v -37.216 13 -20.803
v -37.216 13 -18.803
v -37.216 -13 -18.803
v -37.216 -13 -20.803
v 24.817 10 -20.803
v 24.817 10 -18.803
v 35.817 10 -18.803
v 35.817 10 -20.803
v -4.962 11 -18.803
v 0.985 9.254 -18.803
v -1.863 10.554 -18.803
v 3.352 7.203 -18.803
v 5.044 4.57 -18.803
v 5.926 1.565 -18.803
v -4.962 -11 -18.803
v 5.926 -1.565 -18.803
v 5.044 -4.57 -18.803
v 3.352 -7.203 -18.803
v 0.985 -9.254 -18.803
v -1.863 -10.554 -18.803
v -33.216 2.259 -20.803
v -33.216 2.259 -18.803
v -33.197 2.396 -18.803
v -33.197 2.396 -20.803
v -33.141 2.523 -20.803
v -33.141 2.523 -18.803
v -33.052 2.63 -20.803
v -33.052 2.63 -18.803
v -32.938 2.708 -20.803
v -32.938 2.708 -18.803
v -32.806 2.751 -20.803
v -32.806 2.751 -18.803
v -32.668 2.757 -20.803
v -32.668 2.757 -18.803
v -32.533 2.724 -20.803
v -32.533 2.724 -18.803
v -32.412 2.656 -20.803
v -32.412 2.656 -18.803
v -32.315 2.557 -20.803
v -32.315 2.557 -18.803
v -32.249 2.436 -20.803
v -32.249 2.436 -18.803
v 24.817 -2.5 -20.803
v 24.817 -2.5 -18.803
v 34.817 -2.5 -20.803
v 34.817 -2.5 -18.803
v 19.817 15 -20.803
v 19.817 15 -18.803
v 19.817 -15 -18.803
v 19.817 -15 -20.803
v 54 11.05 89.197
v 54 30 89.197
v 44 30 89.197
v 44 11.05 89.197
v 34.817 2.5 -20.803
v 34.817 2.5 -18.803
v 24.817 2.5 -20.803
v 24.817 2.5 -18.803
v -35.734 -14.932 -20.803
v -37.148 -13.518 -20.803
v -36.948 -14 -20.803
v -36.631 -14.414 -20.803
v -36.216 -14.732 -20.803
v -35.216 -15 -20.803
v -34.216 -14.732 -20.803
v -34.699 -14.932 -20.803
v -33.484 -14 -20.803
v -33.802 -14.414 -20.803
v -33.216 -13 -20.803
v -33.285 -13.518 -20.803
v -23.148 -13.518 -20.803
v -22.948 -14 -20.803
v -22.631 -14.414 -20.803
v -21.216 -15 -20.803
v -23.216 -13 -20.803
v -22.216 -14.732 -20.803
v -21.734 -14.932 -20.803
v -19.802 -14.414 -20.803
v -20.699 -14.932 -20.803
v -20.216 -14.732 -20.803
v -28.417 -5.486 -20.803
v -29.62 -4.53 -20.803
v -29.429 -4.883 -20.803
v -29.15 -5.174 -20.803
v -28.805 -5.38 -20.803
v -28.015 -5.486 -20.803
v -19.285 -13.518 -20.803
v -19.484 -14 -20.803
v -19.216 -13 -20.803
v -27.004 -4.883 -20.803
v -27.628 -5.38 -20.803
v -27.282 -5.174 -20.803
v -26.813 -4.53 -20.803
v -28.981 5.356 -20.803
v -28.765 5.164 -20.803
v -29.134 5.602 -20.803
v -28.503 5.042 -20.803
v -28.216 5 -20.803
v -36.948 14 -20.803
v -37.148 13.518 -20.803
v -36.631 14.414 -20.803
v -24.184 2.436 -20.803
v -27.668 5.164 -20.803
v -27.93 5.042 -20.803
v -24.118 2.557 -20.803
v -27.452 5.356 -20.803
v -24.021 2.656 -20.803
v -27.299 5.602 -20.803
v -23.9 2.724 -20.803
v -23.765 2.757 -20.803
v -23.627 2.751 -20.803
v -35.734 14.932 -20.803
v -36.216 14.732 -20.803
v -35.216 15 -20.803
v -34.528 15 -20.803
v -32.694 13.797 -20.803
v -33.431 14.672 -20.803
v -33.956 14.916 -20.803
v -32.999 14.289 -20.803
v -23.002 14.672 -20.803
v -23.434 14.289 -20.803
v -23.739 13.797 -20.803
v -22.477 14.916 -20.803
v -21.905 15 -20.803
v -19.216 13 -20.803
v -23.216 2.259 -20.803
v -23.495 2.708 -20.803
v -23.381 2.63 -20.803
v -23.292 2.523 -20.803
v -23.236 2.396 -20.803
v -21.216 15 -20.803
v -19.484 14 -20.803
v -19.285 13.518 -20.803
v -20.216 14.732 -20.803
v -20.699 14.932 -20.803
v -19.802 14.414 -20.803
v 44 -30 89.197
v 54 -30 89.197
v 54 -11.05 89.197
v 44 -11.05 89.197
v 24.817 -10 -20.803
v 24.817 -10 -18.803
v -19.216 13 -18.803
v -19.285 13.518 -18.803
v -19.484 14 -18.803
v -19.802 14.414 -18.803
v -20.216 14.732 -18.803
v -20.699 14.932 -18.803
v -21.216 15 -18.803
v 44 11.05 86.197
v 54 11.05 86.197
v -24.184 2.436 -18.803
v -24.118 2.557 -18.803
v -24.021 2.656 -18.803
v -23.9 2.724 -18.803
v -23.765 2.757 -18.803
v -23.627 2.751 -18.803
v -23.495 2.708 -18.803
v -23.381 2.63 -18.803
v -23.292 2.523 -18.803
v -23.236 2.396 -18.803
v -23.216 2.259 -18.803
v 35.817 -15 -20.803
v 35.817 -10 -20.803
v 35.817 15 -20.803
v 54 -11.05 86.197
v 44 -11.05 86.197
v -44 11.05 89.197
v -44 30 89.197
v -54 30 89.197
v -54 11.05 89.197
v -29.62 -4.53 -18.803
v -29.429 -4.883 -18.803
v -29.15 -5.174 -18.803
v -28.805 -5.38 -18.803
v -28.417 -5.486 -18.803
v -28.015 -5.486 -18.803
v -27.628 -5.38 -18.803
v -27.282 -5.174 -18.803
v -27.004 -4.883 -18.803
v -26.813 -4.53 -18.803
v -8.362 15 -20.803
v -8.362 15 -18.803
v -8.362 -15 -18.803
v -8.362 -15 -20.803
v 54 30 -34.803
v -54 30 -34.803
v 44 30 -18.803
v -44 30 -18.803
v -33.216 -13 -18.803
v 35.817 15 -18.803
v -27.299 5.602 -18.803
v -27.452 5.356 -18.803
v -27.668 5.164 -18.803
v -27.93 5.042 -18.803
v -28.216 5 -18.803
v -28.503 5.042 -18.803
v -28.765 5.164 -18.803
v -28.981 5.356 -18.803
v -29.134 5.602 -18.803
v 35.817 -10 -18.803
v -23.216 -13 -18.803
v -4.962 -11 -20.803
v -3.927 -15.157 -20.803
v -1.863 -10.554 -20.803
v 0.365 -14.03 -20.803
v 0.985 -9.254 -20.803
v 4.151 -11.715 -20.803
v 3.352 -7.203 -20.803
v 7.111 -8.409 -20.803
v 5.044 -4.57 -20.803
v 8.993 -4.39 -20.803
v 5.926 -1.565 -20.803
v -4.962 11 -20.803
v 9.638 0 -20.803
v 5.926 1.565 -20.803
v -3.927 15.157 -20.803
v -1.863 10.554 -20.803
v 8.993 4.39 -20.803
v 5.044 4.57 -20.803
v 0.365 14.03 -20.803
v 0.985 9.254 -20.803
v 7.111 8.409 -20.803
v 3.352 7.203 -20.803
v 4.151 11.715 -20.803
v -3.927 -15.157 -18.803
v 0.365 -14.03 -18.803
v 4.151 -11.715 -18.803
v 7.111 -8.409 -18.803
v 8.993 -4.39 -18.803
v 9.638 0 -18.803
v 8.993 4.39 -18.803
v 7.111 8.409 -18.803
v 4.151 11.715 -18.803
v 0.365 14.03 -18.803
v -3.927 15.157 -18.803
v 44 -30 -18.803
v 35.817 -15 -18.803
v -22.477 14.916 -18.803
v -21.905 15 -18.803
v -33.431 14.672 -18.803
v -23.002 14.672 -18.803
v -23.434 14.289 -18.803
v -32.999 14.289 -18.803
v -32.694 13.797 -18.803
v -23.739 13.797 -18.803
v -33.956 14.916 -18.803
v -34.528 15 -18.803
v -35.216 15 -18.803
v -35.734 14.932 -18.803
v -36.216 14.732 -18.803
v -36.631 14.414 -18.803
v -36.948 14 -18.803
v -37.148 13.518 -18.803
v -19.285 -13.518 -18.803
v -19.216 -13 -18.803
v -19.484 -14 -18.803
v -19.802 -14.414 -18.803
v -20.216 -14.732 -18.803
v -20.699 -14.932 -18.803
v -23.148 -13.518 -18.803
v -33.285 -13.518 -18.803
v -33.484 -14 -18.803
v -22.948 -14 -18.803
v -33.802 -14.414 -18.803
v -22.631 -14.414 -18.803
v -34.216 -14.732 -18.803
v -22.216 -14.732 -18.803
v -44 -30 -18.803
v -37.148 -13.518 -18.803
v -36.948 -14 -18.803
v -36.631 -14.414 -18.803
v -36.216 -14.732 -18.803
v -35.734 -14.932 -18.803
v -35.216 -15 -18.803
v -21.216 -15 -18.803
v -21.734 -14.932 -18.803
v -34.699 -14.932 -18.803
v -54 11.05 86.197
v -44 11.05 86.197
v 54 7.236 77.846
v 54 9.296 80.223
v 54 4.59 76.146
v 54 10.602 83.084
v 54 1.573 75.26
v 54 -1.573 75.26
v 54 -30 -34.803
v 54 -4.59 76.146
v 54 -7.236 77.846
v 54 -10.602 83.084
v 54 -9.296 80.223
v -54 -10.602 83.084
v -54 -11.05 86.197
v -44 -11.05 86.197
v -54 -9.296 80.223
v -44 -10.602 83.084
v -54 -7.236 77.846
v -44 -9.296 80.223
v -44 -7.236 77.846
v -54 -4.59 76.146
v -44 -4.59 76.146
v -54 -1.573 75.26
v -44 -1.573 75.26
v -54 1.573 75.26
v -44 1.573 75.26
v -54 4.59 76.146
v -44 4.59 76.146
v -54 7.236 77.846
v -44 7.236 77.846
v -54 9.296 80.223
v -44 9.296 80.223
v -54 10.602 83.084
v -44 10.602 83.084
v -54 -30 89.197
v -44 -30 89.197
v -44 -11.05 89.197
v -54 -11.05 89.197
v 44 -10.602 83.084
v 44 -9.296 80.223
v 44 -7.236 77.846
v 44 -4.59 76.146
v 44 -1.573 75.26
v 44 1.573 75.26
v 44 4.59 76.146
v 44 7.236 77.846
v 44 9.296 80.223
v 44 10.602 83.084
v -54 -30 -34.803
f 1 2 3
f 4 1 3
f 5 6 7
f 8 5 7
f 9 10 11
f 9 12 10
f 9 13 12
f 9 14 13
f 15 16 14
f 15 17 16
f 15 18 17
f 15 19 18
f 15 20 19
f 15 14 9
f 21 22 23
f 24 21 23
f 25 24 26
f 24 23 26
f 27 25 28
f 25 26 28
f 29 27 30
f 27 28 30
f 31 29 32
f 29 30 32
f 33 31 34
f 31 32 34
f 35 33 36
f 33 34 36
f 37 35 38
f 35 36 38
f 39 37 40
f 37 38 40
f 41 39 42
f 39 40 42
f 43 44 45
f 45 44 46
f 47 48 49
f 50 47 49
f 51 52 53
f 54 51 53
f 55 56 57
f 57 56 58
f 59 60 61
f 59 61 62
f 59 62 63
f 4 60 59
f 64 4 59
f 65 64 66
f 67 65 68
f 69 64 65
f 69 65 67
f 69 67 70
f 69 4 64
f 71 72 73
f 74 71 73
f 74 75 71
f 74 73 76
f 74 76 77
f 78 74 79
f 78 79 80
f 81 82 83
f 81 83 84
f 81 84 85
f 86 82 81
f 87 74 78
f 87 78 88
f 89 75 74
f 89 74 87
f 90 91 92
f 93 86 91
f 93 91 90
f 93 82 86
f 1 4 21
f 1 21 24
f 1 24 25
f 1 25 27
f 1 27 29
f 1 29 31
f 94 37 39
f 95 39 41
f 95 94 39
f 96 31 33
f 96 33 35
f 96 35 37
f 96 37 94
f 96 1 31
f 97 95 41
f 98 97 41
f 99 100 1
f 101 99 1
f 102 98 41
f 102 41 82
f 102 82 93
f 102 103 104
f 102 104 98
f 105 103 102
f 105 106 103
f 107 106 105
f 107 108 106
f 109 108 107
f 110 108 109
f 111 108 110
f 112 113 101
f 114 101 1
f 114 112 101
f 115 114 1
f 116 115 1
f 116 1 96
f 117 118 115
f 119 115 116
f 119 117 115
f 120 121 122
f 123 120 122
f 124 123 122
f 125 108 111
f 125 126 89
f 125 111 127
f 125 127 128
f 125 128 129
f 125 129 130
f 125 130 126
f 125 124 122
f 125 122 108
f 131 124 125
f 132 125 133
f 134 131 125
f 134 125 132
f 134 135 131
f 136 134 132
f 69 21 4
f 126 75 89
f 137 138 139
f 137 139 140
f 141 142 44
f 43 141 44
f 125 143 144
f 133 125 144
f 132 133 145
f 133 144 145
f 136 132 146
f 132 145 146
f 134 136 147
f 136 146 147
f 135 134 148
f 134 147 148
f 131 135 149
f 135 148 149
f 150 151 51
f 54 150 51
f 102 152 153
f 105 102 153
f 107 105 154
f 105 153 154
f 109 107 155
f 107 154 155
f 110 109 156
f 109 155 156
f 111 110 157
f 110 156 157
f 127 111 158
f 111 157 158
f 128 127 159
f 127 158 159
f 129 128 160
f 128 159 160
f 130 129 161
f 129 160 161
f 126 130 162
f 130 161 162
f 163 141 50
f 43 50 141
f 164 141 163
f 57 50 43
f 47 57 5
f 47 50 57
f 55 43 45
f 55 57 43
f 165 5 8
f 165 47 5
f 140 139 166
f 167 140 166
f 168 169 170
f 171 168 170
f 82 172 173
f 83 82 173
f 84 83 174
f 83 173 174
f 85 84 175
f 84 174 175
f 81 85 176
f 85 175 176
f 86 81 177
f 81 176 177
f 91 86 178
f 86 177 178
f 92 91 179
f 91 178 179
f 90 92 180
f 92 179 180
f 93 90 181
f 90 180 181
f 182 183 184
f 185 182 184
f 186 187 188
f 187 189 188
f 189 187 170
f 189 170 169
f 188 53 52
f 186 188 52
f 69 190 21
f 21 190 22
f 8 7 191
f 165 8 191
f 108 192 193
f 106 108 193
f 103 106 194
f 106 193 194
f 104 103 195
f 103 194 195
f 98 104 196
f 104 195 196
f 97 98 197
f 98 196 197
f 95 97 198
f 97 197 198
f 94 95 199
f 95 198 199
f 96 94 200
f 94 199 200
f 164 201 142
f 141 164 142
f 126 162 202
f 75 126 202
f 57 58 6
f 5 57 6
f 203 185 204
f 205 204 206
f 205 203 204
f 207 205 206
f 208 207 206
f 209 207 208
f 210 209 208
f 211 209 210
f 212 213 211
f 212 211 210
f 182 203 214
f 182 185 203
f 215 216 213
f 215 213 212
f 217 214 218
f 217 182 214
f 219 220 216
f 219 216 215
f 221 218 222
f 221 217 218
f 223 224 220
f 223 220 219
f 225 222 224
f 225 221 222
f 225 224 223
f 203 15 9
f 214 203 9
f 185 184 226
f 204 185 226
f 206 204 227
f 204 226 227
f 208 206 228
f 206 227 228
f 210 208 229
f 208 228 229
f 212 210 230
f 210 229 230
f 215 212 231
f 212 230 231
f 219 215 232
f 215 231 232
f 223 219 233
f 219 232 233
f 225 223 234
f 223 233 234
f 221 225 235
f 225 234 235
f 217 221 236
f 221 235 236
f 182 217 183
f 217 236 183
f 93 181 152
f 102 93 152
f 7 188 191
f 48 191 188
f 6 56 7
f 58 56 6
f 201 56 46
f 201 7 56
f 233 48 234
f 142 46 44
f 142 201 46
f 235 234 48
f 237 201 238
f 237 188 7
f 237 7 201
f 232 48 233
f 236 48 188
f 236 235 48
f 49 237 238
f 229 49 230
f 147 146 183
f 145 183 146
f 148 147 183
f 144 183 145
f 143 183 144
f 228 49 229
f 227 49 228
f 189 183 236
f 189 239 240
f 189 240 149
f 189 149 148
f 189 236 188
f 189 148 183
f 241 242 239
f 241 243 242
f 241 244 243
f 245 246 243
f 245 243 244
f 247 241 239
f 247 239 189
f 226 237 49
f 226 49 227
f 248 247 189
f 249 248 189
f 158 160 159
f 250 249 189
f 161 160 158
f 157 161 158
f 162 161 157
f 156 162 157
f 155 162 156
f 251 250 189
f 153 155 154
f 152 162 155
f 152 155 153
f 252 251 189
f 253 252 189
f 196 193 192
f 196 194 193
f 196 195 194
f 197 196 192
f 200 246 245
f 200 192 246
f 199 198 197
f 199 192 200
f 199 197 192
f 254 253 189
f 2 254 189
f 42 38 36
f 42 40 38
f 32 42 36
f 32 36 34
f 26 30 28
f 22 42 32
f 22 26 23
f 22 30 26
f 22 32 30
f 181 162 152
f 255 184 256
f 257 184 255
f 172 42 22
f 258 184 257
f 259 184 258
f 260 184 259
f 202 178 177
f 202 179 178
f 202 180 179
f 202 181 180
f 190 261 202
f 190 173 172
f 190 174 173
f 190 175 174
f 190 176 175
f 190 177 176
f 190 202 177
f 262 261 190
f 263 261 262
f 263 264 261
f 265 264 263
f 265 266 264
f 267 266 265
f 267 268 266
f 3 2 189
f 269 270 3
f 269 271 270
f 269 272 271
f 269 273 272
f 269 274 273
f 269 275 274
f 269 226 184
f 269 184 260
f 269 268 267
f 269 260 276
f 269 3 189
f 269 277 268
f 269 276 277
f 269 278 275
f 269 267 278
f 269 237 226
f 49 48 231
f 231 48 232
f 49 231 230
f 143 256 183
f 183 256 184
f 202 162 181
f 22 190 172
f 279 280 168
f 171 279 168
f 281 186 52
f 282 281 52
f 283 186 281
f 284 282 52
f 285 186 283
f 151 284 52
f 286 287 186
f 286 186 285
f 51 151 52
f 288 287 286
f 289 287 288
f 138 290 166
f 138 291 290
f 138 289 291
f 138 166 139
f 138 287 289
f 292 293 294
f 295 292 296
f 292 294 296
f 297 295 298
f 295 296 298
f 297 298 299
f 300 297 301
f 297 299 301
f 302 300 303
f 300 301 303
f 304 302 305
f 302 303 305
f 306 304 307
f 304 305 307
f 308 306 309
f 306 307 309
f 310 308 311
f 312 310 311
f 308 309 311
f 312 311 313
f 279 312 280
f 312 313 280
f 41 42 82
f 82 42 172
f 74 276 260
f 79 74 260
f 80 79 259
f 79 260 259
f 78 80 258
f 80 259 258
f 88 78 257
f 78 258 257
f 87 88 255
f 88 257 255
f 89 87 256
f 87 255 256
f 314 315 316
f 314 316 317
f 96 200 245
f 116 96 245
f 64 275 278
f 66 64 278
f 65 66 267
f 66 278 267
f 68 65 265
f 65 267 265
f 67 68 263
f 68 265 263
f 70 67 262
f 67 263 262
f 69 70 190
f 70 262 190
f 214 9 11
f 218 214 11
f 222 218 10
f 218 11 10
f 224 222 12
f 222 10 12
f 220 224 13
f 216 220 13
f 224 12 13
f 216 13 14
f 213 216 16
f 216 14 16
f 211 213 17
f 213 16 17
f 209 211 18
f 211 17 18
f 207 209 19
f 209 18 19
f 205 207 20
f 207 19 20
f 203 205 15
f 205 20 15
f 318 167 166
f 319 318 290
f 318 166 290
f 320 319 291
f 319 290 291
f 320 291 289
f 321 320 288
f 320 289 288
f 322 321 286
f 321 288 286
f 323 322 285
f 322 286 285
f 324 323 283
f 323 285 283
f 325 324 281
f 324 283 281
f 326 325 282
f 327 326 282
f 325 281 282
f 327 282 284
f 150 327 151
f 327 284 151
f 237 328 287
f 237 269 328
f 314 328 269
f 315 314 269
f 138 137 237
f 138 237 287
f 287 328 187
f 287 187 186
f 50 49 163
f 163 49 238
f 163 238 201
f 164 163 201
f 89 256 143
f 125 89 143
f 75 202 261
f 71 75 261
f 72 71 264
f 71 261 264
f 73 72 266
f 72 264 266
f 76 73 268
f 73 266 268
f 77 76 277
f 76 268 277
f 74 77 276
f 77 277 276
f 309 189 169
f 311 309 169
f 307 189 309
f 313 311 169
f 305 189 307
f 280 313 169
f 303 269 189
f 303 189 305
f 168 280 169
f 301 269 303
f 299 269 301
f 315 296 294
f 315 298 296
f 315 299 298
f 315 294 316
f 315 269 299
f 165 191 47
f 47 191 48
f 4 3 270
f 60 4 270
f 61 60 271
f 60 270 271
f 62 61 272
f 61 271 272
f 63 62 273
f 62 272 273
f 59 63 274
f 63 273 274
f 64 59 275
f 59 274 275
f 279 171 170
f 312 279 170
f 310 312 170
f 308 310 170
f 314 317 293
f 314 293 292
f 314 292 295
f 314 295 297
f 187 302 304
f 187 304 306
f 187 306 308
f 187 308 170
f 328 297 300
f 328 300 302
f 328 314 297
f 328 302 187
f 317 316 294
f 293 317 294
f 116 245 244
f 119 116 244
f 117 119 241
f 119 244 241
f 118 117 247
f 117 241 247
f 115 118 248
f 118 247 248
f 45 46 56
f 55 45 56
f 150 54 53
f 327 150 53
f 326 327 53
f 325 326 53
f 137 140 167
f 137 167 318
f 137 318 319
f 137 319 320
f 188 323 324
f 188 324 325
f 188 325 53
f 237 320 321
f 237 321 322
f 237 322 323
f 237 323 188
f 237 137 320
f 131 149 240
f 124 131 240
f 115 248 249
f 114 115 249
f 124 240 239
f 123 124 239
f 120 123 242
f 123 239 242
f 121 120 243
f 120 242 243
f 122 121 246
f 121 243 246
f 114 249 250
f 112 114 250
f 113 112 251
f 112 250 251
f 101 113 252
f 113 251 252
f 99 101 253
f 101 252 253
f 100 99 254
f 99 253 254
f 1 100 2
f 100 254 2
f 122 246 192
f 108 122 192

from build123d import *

# Parameters (mm, degrees)
F1_DEPTH = 30
F3_DEPTH = 100
F5_DEPTH = 2
F7_DEPTH = 2
F9_DEPTH = 2


with BuildPart() as f1:
    # F0 (on Front) → F1 (new body, symmetric)
    with BuildSketch(Plane.XZ):
        Polygon((-54, 89.197368), (-54, -34.802632), (54, -34.802632), (54, 89.197368), (44, 89.197368), (44, -18.802632), (-44, -18.802632), (-44, 89.197368), align=None)
    extrude(amount=F1_DEPTH, both=True)

    # F2 (on Right) → F3 (cut, symmetric)
    with BuildSketch(Plane.YZ):
        with BuildLine():
            Line((-11.05, 89.197368), (-11.05, 86.197368))
            ThreePointArc((-11.05, 86.197368), (0, 75.147368), (11.05, 86.197368))
            Line((11.05, 86.197368), (11.05, 89.197368))
            Line((11.05, 89.197368), (-11.05, 89.197368))
        make_face()
    extrude(amount=F3_DEPTH, both=True, mode=Mode.SUBTRACT)

    # F4 (on face) → F5 (cut)
    with BuildSketch(Plane.XY.offset(-18.802632)):
        with BuildLine():
            ThreePointArc((-35.216444, 15), (-36.630658, 14.414214), (-37.216444, 13))
            Line((-37.216444, 13), (-37.216444, -13))
            ThreePointArc((-37.216444, -13), (-36.630658, -14.414214), (-35.216444, -15))
            ThreePointArc((-35.216444, -15), (-33.80223, -14.414214), (-33.216444, -13))
            Line((-33.216444, -13), (-33.216444, 2.259175))
            ThreePointArc((-33.216444, 2.259175), (-32.806176, 2.751057), (-32.248652, 2.435726))
            Line((-32.248652, 2.435726), (-29.619821, -4.529654))
            ThreePointArc((-29.619821, -4.529654), (-28.216444, -5.5), (-26.813067, -4.529654))
            Line((-26.813067, -4.529654), (-24.184236, 2.435726))
            ThreePointArc((-24.184236, 2.435726), (-23.626711, 2.751057), (-23.216444, 2.259175))
            Line((-23.216444, 2.259175), (-23.216444, -13))
            ThreePointArc((-23.216444, -13), (-22.630658, -14.414214), (-21.216444, -15))
            ThreePointArc((-21.216444, -15), (-19.80223, -14.414214), (-19.216444, -13))
            Line((-19.216444, -13), (-19.216444, 13))
            ThreePointArc((-19.216444, 13), (-19.80223, 14.414214), (-21.216444, 15))
            Line((-21.216444, 15), (-21.904706, 15))
            ThreePointArc((-21.904706, 15), (-23.001574, 14.672388), (-23.739094, 13.796882))
            Line((-23.739094, 13.796882), (-27.29925, 5.601559))
            ThreePointArc((-27.29925, 5.601559), (-28.216444, 5), (-29.133638, 5.601559))
            Line((-29.133638, 5.601559), (-32.693794, 13.796882))
            ThreePointArc((-32.693794, 13.796882), (-33.431314, 14.672388), (-34.528182, 15))
            Line((-34.528182, 15), (-35.216444, 15))
        make_face()
    extrude(amount=-F5_DEPTH, mode=Mode.SUBTRACT)

    # F6 (on face) → F7 (cut)
    with BuildSketch(Plane.XY.offset(-18.802632)):
        with BuildLine():
            Line((-8.361575, 15), (-8.361575, -15))
            ThreePointArc((-8.361575, -15), (9.638425, 0), (-8.361575, 15))
        make_face()
        with BuildLine():
            Line((-4.961575, -11), (-4.961575, 11))
            ThreePointArc((-4.961575, 11), (6.038425, 0), (-4.961575, -11))
        make_face(mode=Mode.SUBTRACT)
    extrude(amount=-F7_DEPTH, mode=Mode.SUBTRACT)

    # F8 (on face) → F9 (cut)
    with BuildSketch(Plane.XY.offset(-18.802632)):
        Polygon((19.817374, 15), (19.817374, -15), (35.817374, -15), (35.817374, -10), (24.817374, -10), (24.817374, -2.5), (34.817374, -2.5), (34.817374, 2.5), (24.817374, 2.5), (24.817374, 10), (35.817374, 10), (35.817374, 15), align=None)
    extrude(amount=-F9_DEPTH, mode=Mode.SUBTRACT)


solid = f1.part
